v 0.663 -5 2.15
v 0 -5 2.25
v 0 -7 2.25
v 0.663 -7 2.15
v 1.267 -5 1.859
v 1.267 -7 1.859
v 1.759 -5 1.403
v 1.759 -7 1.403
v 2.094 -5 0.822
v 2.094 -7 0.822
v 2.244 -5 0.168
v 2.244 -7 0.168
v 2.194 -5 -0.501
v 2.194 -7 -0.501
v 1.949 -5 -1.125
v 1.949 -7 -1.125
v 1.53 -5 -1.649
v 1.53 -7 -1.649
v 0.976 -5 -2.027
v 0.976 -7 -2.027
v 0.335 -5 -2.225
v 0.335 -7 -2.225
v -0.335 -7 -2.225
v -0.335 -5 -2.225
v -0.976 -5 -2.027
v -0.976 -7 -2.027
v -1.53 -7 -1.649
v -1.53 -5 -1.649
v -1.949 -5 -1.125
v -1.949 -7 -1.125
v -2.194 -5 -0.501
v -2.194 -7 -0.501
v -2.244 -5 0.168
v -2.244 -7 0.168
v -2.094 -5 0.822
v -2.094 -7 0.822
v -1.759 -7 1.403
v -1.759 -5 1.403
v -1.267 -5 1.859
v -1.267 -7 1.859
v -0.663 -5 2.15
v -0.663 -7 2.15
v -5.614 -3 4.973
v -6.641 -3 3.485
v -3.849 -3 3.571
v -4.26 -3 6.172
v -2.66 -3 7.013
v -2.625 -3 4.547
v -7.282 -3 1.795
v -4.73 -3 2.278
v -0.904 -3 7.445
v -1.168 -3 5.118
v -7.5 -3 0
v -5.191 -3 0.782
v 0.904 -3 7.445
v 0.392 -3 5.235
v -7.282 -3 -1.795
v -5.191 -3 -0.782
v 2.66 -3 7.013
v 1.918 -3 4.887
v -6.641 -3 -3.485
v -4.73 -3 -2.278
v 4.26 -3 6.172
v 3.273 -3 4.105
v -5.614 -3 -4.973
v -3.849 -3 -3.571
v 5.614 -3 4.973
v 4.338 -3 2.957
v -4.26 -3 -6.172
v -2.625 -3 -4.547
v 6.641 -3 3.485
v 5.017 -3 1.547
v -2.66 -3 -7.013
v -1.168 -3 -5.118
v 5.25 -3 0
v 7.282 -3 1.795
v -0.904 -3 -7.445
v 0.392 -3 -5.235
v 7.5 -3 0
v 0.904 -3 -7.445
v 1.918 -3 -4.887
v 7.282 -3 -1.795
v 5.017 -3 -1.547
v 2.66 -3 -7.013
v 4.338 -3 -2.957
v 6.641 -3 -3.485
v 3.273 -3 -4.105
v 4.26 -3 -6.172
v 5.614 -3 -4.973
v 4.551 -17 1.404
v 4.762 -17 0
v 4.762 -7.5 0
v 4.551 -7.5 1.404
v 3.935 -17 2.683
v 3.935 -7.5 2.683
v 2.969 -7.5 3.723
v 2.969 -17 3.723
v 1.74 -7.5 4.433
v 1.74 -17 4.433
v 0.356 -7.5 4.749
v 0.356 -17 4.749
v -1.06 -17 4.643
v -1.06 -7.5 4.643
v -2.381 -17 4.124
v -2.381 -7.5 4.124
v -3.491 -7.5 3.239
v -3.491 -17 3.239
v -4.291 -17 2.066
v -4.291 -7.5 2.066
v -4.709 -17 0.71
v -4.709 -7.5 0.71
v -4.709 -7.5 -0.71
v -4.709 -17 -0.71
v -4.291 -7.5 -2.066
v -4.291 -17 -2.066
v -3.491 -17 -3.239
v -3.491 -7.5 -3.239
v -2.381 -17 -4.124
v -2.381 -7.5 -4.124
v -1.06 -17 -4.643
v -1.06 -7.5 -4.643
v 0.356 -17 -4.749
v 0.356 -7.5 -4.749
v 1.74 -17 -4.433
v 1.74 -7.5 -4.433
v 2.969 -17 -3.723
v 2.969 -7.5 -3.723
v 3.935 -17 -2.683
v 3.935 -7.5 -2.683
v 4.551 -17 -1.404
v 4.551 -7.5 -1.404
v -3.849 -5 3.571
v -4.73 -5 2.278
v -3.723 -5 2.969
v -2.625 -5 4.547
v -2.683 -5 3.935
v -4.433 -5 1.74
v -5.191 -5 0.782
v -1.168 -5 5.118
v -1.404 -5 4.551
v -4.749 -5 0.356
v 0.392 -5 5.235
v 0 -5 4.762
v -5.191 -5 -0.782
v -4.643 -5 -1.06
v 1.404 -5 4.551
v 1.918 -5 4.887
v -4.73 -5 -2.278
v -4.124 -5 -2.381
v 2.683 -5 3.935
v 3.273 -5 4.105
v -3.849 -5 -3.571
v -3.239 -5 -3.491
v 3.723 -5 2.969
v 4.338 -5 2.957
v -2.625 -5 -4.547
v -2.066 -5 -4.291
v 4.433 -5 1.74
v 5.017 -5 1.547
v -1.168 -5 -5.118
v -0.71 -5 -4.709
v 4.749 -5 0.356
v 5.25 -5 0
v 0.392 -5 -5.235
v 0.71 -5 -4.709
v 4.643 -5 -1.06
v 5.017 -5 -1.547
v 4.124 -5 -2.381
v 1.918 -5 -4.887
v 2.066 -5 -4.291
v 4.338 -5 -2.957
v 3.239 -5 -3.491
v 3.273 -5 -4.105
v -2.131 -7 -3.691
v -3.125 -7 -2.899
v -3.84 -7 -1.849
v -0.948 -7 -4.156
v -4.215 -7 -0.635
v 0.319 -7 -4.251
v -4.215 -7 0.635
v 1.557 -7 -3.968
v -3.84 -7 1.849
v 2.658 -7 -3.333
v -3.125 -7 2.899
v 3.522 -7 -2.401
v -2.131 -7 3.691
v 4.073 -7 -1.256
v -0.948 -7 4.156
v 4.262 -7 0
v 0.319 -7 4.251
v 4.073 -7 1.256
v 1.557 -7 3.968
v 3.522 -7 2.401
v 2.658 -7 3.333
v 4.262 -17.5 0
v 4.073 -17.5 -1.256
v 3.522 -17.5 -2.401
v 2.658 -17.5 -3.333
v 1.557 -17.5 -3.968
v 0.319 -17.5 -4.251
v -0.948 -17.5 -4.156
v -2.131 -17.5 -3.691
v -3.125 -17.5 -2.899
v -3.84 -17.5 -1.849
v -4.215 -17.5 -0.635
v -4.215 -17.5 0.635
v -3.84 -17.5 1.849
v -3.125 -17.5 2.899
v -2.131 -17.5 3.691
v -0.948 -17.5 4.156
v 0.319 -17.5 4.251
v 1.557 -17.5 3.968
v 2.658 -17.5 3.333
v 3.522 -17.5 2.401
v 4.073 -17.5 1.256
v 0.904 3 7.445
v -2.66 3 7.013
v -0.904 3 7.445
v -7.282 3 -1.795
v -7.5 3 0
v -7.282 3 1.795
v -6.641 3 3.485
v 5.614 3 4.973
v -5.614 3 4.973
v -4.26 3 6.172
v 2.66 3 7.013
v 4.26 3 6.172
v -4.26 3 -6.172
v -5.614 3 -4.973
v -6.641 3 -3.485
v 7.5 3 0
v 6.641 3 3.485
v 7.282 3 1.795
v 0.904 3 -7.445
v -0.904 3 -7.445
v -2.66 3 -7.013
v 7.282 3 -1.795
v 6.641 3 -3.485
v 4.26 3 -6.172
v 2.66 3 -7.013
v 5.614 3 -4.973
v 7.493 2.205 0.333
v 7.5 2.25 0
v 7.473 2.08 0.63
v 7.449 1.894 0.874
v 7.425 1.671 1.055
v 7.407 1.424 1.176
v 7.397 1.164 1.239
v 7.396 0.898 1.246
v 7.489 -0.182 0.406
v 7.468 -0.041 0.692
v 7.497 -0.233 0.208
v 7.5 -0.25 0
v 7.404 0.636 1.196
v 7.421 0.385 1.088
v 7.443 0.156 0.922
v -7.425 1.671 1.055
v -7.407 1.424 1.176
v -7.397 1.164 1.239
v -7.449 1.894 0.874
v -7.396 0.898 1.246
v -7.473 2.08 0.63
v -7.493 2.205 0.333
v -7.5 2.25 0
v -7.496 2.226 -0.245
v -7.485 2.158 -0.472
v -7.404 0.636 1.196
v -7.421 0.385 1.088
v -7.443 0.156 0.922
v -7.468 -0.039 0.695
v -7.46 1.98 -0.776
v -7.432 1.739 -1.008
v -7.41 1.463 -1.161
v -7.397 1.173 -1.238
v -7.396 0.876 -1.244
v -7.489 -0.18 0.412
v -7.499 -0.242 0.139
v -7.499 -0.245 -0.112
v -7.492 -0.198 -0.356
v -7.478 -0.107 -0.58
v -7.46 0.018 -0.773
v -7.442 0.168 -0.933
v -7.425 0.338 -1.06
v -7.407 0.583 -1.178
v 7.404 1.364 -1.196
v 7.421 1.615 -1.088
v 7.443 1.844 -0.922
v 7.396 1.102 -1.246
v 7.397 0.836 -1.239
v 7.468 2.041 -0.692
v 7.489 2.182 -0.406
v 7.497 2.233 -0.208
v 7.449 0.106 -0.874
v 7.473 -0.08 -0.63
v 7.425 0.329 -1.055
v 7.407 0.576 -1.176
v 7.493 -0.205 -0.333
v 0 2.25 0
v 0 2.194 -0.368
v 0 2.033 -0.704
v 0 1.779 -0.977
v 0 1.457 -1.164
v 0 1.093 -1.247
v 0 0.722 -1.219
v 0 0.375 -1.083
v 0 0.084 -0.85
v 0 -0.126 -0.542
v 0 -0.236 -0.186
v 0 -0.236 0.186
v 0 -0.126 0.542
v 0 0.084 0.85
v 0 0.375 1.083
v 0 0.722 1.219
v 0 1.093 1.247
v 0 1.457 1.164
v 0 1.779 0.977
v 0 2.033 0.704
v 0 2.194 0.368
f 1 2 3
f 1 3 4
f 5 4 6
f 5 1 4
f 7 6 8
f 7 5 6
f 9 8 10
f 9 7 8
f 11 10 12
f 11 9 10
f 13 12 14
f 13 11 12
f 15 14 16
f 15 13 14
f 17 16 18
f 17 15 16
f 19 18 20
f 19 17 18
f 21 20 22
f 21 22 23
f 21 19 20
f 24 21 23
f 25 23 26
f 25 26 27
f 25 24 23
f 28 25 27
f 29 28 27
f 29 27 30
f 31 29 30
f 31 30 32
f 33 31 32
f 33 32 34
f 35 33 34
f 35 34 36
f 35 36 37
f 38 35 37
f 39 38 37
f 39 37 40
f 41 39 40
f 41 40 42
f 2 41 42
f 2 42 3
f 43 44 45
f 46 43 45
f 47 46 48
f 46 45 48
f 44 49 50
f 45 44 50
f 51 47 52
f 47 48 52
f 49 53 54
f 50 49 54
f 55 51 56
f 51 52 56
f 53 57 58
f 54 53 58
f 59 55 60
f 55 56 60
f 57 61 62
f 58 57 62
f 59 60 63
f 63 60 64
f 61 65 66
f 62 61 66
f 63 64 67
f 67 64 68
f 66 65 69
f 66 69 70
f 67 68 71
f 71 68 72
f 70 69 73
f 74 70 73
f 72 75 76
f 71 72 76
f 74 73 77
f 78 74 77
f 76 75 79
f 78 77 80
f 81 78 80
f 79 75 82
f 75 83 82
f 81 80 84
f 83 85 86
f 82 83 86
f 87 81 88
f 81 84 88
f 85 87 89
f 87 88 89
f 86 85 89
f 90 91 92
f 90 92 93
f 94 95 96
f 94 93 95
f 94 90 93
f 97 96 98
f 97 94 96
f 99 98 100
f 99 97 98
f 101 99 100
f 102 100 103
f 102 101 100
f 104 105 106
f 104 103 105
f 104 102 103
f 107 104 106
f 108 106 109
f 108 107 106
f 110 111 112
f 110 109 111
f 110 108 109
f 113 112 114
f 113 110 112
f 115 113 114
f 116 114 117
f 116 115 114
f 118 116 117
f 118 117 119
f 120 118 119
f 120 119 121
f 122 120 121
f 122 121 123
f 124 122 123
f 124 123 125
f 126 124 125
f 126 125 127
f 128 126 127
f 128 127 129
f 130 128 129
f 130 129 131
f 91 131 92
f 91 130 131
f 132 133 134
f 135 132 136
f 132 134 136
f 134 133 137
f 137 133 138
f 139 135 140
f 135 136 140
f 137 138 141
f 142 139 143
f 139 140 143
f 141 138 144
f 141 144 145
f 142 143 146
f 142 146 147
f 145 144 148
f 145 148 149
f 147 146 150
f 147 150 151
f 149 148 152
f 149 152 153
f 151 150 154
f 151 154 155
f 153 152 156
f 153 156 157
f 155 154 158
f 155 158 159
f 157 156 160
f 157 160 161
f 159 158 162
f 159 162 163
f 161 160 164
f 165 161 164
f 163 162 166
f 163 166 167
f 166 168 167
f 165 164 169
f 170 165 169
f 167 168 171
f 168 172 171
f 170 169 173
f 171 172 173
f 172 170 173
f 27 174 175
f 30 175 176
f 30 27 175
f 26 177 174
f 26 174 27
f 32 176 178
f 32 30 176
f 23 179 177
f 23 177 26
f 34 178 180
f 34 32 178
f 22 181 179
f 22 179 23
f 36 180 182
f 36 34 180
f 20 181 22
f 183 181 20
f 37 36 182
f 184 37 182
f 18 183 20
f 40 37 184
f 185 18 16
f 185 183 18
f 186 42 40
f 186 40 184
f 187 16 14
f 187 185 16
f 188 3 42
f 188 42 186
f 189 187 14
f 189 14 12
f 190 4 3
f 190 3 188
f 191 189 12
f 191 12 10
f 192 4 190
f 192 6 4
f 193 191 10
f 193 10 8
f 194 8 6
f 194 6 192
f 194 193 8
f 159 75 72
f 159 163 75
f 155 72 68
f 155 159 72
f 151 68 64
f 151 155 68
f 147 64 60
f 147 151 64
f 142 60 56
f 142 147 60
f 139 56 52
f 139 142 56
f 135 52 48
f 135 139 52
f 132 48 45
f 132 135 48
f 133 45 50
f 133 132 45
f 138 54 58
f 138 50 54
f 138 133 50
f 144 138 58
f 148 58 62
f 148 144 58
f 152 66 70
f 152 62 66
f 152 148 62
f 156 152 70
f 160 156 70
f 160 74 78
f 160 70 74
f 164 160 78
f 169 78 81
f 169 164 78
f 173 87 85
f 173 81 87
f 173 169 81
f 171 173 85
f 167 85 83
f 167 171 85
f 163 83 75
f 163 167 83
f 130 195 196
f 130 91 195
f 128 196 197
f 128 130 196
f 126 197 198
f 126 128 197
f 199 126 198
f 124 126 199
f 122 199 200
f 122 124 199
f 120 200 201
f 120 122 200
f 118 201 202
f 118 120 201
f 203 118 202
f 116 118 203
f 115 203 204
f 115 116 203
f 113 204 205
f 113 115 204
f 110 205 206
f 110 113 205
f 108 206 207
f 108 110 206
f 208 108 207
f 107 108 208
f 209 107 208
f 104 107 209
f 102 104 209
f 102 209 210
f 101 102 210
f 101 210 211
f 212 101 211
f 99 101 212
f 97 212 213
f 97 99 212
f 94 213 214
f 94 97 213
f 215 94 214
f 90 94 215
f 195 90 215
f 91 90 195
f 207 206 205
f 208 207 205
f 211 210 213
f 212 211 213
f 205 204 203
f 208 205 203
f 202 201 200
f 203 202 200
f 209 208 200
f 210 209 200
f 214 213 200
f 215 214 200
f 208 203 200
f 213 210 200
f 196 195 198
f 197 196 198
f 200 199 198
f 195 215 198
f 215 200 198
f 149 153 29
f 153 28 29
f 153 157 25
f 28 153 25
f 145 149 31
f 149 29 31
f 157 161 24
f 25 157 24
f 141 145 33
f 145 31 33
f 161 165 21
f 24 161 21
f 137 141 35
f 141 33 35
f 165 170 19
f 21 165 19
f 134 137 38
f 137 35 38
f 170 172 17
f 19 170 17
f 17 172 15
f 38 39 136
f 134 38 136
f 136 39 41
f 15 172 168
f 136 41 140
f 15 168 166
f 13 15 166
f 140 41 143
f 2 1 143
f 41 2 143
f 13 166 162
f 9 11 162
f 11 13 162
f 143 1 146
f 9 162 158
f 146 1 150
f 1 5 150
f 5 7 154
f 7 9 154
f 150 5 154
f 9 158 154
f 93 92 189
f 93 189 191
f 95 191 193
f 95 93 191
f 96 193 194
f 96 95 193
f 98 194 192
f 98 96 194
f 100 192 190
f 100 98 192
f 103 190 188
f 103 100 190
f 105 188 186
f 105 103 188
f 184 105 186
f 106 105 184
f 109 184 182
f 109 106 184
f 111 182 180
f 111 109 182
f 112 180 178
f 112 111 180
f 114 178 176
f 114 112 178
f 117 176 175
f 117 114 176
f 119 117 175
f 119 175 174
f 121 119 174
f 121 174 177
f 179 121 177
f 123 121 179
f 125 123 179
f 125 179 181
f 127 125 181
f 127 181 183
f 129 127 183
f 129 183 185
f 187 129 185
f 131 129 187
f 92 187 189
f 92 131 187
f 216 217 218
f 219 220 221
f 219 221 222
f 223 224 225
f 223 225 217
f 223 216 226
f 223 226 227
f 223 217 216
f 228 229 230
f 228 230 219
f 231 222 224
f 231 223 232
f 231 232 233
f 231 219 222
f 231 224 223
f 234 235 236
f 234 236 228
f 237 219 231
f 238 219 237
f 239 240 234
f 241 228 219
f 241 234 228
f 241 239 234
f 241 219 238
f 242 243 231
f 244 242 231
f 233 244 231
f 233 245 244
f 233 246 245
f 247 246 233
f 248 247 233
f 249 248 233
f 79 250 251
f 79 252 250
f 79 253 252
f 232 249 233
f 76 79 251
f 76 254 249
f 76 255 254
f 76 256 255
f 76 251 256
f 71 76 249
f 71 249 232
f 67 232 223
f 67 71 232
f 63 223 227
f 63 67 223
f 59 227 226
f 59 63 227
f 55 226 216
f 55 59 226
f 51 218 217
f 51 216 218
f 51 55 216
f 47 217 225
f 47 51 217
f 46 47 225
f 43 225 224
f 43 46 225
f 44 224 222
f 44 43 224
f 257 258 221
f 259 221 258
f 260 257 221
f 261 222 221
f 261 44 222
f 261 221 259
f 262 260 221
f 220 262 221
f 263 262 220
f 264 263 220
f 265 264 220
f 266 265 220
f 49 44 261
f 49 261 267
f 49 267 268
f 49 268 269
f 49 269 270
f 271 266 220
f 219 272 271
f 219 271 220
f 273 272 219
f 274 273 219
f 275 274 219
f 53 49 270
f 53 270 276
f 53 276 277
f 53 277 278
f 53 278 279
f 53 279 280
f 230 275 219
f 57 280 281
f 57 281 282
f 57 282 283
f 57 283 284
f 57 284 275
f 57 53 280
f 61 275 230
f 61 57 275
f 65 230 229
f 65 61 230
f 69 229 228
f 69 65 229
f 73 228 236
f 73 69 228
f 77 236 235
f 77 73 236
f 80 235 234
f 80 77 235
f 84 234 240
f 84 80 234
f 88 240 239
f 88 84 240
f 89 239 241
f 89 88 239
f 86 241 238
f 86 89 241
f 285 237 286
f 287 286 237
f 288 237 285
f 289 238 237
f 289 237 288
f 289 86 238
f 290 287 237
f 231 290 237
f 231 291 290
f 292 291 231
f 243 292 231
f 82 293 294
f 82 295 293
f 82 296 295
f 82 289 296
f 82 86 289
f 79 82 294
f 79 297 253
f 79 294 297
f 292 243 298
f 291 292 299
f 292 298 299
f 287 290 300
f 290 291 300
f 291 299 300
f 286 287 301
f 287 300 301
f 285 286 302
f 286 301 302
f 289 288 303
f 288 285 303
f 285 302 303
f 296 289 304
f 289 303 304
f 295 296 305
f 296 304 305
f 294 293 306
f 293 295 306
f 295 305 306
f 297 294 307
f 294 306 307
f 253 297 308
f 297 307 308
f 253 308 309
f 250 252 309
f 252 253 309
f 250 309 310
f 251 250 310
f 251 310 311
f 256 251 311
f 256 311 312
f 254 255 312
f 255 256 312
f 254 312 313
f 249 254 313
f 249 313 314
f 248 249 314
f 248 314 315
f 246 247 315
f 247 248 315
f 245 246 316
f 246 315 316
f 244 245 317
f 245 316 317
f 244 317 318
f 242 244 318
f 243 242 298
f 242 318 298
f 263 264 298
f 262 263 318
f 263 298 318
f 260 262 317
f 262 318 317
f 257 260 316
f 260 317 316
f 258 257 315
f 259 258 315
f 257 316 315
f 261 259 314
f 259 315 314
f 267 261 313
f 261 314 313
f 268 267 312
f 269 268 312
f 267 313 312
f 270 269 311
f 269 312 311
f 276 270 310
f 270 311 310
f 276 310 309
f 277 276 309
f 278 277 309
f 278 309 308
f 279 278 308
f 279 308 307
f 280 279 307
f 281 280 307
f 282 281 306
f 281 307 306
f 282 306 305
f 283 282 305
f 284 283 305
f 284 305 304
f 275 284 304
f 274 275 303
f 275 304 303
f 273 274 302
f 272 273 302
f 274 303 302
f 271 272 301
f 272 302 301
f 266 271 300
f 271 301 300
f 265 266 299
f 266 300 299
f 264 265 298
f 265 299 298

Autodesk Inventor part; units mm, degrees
ref_plane "YZ Plane" through (0, 0, 0) normal (1, 0, 0) x (0, 1, 0)
ref_plane "XZ Plane" through (0, 0, 0) normal (0, 1, 0) x (-1, 0, 0)
ref_plane "XY Plane" through (0, 0, 0) normal (0, 0, 1) x (1, 0, 0)
sketch "Sketch3" plane through (0, 0, 0) normal (0, 0, 1) x (1, 0, 0)
  line L0 (0, 3) -> (7.5, 3)
  line L1 (7.5, 3) -> (7.5, -3)
  line L2 (7.5, -3) -> (5.25, -3)
  line L3 (5.25, -3) -> (5.25, -5)
  line L4 (5.25, -5) -> (4.7625, -5)
  line L5 (0, -21.6) -> (0, 7.1) projected
  line L6 (4.7625, -5) -> (4.7625, -17.5)
  line L7 (4.7625, -17.5) -> (0, -17.5)
  point P0 (0, 0)
  point P1 (7.5, 0)
  dimension "d6" = 6
  dimension "d7" = 15
  dimension "d8" = 10.5
  dimension "d9" = 2
  dimension "d11" = 9.525
  dimension "d12" = 12.5
revolve "Revolution1" add sketch "Sketch3" angle 360 about axis through (0, -10, 0) along (0, 1, 0)
sketch "Sketch4" plane through (0, 0, 0) normal (1, 0, 0) x (0, 1, 0)
  circle A0 centre (1, 0) radius 1.25
  line L0 (3, 7.5) -> (3, -7.5) projected
  point P0 (0, 0)
  dimension "d13" = 2.5
  dimension "d14" = 2
extrude "Extrusion3" cut sketch "Sketch4" along normal through all both and the other way through all
sketch "Sketch5" plane through (0, 0, 0) normal (1, 0, 0) x (0, 1, 0)
  line L0 (-7, 2.25) -> (-5, 2.25)
  line L1 (-5, 2.25) -> (-5, 4.7625)
  line L2 (-5, 4.7625) -> (-7, 4.7625)
  line L3 (-7, 4.7625) -> (-7, 2.25)
  line L4 (-5, 4.7625) -> (-17.5, 4.7625) projected
  line L5 (-5, 5.25) -> (-5, -5.25) projected
  line L6 (-21, 0) -> (3.5, 0) projected
  point P0 (0, 0)
  dimension "d17" = 2
  dimension "d18" = 4.5
revolve "Revolution2" cut sketch "Sketch5" angle 360 about axis through (0, -10, 0) along (0, 1, 0)
thread "Thread1" size "M6x1" class "6g" standard "ANSI Metric M Profile" full length
chamfer "Chamfer1" distance 0.5 angle 45 2 edges at (-4.7625, -17.5, 0) (-4.7625, -7, 0)
properties part number "Thumb Screw" material "Steel, Mild"
